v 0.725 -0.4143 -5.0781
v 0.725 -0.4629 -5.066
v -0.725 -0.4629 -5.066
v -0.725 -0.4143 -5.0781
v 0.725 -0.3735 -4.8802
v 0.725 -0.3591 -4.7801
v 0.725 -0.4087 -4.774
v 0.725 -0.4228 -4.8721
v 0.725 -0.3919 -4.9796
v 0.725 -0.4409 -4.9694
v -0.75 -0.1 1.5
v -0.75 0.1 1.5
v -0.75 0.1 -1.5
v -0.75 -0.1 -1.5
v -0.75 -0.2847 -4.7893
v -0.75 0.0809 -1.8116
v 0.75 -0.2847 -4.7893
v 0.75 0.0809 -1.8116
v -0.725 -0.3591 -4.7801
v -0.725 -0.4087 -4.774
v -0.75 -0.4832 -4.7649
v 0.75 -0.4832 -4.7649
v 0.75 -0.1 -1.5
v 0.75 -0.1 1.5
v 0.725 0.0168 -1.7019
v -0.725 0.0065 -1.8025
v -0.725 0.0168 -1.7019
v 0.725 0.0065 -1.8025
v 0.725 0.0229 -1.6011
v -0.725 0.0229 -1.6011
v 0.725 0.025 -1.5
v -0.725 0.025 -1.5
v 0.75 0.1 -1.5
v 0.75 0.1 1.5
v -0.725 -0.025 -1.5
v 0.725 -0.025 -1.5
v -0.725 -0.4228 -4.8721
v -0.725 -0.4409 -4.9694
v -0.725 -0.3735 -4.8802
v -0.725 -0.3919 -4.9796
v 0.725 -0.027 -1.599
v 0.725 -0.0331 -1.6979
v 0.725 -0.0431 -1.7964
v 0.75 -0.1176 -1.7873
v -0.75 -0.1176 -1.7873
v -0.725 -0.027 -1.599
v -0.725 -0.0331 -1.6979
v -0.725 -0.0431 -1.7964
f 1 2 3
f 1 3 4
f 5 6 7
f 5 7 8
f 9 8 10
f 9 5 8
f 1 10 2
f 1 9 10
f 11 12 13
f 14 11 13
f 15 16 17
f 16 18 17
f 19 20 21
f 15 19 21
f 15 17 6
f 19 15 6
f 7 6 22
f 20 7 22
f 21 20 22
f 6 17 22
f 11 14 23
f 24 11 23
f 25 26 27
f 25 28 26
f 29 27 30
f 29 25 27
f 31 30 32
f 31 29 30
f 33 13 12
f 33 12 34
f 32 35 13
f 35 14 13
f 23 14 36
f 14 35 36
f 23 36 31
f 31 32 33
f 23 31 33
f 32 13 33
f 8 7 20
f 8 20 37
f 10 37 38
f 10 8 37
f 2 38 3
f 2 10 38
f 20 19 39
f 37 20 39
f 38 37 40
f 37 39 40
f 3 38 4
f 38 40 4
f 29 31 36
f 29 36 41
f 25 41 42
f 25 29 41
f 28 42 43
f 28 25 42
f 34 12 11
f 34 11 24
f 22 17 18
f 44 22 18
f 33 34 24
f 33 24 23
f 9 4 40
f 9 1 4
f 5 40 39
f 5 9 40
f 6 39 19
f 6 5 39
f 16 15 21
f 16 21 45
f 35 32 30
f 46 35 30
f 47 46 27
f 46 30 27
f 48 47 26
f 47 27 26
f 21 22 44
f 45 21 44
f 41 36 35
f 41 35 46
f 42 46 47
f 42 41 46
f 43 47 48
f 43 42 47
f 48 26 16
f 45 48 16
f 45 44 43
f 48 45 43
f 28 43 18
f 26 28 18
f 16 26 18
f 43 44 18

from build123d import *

# Parameters (mm, degrees)
SKETCH1_W           = 1.5
SKETCH1_H           = 3
BOSS_EXTRUDE1_DEPTH = 0.1
BOSS_EXTRUDE3_DEPTH = 0.725
BOSS_EXTRUDE4_DEPTH = 0.75
BOSS_EXTRUDE5_DEPTH = 0.725


with BuildPart() as part:
    # Sketch1 → Boss-Extrude1 (new, symmetric)
    with BuildSketch(Plane(origin=(0, 0, 0), x_dir=(1, 0, 0), z_dir=(0, 1, 0))):
        Rectangle(SKETCH1_W, SKETCH1_H)
    extrude(amount=BOSS_EXTRUDE1_DEPTH, both=True)

    # Sketch3 → Boss-Extrude3 (add, symmetric)
    with BuildSketch(Plane(origin=(0, 0, 0), x_dir=(0, 0, -1), z_dir=(1, 0, 0))):
        with BuildLine():
            Line((1.5, 0.025), (1.5, -0.025))
            ThreePointArc((1.5, -0.025), (1.648473787, -0.029536284), (1.796393706, -0.043128216))
            Line((1.796393706, -0.043128216), (1.802487173, 0.006499092))
            ThreePointArc((1.802487173, 0.006499092), (1.651526213, 0.020370455), (1.5, 0.025))
        make_face()
    extrude(amount=BOSS_EXTRUDE3_DEPTH, both=True)

    # Sketch4 → Boss-Extrude4 (add, symmetric)
    with BuildSketch(Plane(origin=(0, 0, 0), x_dir=(0, 0, -1), z_dir=(1, 0, 0))):
        Polygon((1.787253505, -0.117569177), (1.811627374, 0.080940053), (4.789265829, -0.284667977), (4.76489196, -0.483177207), align=None)
    extrude(amount=BOSS_EXTRUDE4_DEPTH, both=True)

    # Sketch6 → Boss-Extrude5 (add, symmetric)
    with BuildSketch(Plane(origin=(0, 0, 0), x_dir=(0, 0, -1), z_dir=(1, 0, 0))):
        with BuildLine():
            Line((4.780125628, -0.359108938), (4.774032161, -0.408736246))
            ThreePointArc((4.774032161, -0.408736246), (4.920846412, -0.43133312), (5.066007319, -0.462850643))
            Line((5.066007319, -0.462850643), (5.078103414, -0.414335857))
            ThreePointArc((5.078103414, -0.414335857), (4.929958189, -0.382170375), (4.780125628, -0.359108938))
        make_face()
    extrude(amount=BOSS_EXTRUDE5_DEPTH, both=True)


solid = part.part
